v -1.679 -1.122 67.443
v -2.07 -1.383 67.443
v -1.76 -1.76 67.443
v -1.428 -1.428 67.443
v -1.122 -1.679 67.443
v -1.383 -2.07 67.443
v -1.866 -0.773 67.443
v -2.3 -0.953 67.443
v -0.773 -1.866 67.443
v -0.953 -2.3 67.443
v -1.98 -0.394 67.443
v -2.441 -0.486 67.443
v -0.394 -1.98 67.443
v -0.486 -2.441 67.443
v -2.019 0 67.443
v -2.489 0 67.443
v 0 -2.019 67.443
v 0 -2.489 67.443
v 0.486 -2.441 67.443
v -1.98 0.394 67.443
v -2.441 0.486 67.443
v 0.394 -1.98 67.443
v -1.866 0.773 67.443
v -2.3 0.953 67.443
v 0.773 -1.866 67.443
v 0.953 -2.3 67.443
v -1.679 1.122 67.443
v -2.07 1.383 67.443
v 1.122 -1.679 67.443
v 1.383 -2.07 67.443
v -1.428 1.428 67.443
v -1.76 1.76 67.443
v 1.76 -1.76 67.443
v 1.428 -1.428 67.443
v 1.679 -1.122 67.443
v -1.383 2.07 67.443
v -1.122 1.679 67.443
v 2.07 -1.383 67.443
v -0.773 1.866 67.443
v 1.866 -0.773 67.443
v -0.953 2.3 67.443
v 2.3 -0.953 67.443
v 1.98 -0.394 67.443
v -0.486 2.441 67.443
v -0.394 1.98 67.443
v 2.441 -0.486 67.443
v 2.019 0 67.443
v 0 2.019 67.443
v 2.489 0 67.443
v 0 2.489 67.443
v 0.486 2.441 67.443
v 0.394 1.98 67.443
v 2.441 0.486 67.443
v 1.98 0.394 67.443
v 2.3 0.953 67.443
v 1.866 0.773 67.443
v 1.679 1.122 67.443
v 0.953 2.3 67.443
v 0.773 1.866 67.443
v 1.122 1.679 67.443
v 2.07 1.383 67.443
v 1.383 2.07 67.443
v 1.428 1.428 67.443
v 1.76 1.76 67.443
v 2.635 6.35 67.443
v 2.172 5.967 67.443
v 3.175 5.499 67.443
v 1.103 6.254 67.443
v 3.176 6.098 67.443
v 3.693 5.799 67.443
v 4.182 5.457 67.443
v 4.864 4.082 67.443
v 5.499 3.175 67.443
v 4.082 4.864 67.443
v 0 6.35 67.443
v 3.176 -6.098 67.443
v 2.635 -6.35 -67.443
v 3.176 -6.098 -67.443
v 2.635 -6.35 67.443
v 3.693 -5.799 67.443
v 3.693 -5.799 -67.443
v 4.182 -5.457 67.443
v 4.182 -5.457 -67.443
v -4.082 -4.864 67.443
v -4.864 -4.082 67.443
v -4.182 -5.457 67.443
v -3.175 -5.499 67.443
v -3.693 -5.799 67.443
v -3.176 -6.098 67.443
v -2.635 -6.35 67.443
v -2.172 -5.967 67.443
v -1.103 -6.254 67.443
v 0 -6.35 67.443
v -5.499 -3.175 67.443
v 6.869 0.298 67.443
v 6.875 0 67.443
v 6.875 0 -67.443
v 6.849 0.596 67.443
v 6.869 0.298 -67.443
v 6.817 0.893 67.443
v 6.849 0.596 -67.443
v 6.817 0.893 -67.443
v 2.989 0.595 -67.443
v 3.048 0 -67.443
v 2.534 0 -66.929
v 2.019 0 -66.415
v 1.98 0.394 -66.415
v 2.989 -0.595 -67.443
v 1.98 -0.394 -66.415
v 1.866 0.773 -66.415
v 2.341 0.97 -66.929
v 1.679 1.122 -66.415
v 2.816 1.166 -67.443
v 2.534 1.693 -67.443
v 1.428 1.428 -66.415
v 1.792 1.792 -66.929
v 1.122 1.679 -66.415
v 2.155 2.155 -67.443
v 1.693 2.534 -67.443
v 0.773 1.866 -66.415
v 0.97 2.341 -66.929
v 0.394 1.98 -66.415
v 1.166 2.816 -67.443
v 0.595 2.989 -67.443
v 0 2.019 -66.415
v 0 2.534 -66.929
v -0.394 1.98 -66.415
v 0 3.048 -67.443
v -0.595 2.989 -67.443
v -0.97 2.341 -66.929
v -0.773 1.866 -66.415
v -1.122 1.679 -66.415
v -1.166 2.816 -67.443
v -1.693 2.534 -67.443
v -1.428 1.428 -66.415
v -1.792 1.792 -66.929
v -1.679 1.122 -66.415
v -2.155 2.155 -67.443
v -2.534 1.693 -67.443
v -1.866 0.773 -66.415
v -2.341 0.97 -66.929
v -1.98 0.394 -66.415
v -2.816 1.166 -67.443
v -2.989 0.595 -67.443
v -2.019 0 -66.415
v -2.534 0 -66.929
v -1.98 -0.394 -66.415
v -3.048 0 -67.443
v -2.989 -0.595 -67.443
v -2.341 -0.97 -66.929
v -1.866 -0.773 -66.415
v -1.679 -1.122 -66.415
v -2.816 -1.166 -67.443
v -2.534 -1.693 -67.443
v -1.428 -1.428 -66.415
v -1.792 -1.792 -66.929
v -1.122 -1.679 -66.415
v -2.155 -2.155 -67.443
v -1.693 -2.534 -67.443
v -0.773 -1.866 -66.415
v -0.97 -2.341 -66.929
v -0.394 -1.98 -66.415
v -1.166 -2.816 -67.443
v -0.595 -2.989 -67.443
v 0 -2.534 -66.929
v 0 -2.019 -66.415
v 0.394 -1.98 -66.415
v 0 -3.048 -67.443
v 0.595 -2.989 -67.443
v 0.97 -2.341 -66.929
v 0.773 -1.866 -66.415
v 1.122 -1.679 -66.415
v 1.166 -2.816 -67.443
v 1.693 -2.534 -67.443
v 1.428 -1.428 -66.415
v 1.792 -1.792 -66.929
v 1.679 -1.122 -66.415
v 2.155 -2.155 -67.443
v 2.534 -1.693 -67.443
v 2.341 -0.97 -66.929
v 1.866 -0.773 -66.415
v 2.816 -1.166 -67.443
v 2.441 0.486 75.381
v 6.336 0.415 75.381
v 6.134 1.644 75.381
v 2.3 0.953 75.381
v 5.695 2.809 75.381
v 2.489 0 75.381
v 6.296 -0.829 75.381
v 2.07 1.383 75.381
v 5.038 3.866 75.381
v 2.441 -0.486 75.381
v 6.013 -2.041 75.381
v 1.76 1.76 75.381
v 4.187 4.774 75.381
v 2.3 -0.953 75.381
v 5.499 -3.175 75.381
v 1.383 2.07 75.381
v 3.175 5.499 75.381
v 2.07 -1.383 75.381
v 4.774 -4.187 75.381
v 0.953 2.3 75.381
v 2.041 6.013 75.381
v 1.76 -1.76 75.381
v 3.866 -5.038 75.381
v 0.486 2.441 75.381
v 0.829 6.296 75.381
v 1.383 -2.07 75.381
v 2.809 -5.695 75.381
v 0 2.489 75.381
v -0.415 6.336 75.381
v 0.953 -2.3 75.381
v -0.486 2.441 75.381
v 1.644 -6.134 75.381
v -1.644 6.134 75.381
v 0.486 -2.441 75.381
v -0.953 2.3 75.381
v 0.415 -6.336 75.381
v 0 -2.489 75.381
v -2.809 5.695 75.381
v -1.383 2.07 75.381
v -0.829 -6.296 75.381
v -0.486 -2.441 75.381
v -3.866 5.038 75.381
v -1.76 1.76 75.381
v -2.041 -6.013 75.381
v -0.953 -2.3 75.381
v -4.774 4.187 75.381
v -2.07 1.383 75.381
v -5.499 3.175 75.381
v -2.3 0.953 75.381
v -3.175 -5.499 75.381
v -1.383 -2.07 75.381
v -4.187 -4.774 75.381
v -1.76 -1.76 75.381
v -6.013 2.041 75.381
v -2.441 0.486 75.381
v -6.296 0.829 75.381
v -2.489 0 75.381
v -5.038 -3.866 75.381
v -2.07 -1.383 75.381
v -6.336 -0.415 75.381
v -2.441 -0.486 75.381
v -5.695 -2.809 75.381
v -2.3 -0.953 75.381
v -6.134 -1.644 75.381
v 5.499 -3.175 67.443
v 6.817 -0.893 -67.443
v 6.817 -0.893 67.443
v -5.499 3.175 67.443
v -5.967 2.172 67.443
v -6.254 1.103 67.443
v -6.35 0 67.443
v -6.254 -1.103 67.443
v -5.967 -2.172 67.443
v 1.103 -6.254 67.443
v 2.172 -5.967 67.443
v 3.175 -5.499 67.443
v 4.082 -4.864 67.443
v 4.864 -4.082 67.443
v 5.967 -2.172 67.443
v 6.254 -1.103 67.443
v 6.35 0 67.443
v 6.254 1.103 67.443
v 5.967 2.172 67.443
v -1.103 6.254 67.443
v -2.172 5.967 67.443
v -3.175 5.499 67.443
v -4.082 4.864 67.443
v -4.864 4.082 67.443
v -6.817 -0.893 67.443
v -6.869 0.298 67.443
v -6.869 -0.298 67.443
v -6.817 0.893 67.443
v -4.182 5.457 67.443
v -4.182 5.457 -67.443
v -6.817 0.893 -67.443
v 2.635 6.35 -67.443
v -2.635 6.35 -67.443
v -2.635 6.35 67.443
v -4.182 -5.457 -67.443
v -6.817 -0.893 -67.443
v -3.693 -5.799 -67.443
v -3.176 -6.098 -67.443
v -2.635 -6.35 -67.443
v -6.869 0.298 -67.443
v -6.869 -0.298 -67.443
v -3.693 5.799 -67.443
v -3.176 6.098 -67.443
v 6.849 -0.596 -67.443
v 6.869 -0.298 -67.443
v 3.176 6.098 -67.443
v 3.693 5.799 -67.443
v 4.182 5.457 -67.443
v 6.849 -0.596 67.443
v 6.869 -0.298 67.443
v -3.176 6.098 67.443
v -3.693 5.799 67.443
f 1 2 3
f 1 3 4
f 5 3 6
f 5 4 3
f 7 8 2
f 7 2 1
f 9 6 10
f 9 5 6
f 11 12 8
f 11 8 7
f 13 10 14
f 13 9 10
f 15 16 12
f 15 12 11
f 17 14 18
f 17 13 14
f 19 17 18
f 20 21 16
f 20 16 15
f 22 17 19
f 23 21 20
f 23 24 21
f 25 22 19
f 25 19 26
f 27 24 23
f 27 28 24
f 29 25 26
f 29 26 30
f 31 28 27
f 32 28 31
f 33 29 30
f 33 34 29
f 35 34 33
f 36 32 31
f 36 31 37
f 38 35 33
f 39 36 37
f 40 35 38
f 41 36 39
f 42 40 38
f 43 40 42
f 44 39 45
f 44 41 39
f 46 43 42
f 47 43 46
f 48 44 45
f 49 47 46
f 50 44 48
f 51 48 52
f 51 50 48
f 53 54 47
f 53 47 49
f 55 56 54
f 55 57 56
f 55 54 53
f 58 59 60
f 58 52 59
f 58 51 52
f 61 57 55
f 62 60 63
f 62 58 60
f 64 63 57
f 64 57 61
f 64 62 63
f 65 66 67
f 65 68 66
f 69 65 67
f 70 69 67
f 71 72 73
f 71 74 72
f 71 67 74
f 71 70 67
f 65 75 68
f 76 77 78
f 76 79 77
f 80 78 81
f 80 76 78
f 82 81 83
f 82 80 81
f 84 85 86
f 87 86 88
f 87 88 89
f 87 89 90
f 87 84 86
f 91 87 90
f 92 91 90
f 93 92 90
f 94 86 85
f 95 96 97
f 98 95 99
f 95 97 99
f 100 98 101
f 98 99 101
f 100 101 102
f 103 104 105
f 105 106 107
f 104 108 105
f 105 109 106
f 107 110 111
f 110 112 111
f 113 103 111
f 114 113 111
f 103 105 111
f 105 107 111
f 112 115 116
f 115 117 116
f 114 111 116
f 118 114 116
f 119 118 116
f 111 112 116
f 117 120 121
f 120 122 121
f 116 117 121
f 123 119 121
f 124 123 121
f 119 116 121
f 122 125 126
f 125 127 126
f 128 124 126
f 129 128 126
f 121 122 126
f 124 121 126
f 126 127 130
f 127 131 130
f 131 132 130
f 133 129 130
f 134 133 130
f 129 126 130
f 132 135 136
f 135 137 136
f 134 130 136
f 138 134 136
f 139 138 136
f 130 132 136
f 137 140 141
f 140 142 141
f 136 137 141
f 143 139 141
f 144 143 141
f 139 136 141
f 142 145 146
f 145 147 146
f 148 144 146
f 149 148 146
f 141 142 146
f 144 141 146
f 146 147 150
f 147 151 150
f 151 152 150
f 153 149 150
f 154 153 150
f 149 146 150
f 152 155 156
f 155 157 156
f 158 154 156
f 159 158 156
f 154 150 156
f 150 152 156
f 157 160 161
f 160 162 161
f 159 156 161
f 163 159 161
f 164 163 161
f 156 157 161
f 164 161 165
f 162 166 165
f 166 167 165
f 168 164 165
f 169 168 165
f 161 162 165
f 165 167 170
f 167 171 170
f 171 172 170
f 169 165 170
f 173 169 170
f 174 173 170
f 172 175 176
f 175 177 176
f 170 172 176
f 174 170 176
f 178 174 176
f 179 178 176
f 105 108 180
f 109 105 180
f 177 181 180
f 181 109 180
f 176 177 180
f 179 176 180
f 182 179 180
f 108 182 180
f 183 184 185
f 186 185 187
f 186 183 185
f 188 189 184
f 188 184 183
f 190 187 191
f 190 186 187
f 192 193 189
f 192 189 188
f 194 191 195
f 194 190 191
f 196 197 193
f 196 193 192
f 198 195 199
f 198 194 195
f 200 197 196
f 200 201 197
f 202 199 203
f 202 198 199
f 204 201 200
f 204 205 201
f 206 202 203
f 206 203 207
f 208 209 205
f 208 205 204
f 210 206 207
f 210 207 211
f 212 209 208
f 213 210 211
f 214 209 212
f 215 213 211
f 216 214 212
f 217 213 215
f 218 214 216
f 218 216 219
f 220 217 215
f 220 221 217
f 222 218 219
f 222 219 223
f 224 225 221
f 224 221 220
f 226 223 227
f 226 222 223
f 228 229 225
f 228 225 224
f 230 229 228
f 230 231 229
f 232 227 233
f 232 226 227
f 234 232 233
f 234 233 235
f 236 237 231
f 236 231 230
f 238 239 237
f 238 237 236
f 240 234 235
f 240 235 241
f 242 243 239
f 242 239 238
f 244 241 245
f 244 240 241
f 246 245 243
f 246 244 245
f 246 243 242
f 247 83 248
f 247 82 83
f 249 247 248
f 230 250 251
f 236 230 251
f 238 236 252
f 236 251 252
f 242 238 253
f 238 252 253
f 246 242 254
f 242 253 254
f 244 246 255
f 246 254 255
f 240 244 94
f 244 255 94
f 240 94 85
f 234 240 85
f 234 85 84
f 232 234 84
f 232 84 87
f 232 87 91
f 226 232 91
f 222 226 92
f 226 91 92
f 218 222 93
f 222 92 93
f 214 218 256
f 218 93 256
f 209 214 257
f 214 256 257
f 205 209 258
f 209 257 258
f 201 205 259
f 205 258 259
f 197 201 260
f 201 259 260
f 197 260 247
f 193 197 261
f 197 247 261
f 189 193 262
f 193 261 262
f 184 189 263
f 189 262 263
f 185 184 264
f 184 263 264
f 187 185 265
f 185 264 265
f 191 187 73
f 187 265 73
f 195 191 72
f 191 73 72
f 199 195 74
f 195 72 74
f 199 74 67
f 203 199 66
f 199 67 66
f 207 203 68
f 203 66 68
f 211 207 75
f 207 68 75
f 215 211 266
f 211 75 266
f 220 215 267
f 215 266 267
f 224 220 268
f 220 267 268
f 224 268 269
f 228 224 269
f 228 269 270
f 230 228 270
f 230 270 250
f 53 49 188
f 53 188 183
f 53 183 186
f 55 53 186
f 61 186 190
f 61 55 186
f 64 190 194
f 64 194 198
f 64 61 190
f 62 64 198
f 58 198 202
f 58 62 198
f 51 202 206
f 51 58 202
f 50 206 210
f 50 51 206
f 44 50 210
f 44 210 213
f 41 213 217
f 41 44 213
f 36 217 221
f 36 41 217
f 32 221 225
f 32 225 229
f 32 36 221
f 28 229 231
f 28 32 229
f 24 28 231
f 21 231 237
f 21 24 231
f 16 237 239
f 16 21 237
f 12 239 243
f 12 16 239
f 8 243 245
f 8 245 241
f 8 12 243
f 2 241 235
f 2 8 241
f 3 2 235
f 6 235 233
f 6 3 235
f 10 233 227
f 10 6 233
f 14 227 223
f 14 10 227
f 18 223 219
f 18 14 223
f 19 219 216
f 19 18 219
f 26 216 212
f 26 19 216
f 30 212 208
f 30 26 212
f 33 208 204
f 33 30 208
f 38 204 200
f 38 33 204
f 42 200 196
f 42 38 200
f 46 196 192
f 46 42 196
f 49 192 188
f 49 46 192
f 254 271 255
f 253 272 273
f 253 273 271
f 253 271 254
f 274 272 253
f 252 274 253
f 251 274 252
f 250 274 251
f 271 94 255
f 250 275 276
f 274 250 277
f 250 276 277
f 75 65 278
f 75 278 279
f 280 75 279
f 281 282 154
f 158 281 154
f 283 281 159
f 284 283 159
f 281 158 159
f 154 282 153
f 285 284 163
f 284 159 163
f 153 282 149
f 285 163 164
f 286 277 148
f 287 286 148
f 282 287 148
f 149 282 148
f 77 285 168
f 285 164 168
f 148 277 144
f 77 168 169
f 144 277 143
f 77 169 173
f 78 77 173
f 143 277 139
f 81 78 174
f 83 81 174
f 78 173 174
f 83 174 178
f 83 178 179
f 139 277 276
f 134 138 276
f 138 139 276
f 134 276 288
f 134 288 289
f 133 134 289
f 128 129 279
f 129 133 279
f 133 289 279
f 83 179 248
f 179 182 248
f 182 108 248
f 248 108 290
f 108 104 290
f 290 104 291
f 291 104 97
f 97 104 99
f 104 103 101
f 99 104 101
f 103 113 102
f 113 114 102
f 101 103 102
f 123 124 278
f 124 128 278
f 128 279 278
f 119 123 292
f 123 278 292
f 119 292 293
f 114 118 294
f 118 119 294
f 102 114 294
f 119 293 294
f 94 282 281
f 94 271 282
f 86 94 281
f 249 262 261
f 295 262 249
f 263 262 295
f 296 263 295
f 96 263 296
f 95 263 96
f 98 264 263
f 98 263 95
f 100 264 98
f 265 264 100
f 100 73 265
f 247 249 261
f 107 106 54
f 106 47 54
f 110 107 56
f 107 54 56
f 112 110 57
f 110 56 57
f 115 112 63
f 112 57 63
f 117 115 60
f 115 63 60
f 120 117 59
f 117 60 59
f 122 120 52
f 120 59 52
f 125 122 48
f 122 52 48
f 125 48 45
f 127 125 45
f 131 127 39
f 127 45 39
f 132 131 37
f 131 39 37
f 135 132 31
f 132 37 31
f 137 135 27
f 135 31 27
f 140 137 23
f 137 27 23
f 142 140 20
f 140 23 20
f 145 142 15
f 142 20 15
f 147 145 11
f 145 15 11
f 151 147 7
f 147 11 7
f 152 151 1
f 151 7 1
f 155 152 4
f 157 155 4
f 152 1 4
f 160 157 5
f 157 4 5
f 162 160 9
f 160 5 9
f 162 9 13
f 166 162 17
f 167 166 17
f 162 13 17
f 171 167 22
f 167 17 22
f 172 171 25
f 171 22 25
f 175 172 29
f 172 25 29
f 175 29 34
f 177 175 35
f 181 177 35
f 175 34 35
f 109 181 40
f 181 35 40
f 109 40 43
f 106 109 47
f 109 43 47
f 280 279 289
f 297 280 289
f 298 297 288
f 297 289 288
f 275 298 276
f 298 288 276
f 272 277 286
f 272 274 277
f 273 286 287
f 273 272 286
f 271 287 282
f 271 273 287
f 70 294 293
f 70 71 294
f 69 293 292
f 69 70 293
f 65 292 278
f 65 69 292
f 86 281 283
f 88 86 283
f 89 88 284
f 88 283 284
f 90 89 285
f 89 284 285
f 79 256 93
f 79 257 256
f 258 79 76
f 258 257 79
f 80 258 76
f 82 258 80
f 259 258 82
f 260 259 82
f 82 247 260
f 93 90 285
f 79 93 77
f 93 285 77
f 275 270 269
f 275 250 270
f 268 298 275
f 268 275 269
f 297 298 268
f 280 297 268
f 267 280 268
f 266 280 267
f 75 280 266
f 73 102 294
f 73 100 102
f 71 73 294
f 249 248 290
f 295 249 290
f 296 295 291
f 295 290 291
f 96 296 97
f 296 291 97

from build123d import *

# Parameters (mm, degrees)
BOSS_EXTRUDE1_DEPTH              = 67.44335
SKETCH4_R                        = 6.35
SKETCH4_R_2                      = 2.4892
BOSS_EXTRUDE2_DEPTH              = 7.9375
F_10_32_TAPPED_HOLE1_D           = 4.0386
F_10_32_TAPPED_HOLE1_CSINK_D     = 6.096
F_10_32_TAPPED_HOLE1_CSINK_ANGLE = 90


with BuildPart() as part:
    # Sketch1 → Boss-Extrude1 (new, symmetric)
    with BuildSketch(Plane.XY):
        with BuildLine():
            ThreePointArc((4.181770846, 5.456960429), (3.437499983, 5.953924622), (2.634980936, 6.35))
            Line((2.634980936, 6.35), (-2.634980936, 6.35))
            ThreePointArc((-2.634980936, 6.35), (-3.437499983, 5.953924622), (-4.181770846, 5.456960429))
            Line((-4.181770846, 5.456960429), (-6.816751782, 0.893039571))
            ThreePointArc((-6.816751782, 0.893039571), (-6.874999966, 0), (-6.816751782, -0.893039571))
            Line((-6.816751782, -0.893039571), (-4.181770846, -5.456960429))
            ThreePointArc((-4.181770846, -5.456960429), (-3.437499983, -5.953924622), (-2.634980936, -6.35))
            Line((-2.634980936, -6.35), (2.634980936, -6.35))
            ThreePointArc((2.634980936, -6.35), (3.437499983, -5.953924622), (4.181770846, -5.456960429))
            Line((4.181770846, -5.456960429), (6.816751782, -0.893039571))
            ThreePointArc((6.816751782, -0.893039571), (6.860422465, -0.447468582), (6.874999966, 0))
            ThreePointArc((6.874999966, 0), (6.860422465, 0.447468582), (6.816751782, 0.893039571))
            Line((6.816751782, 0.893039571), (4.181770846, 5.456960429))
        make_face()
    extrude(amount=BOSS_EXTRUDE1_DEPTH, both=True)

    # Sketch4 → Boss-Extrude2 (add)
    with BuildSketch(Plane.XY.offset(67.44335)):
        with Locations(Location((0, 0, 0), (0, 0, 150))):
            Circle(SKETCH4_R)
        Circle(SKETCH4_R_2, mode=Mode.SUBTRACT)
    extrude(amount=BOSS_EXTRUDE2_DEPTH)

    # #10-32 Tapped Hole1 (through all)
    with Locations(Plane(origin=(0, 0, -67.44335), x_dir=(-1, 0, 0), z_dir=(0, 0, -1))):
        with Locations((0, 0)):
            CounterSinkHole(F_10_32_TAPPED_HOLE1_D / 2, F_10_32_TAPPED_HOLE1_CSINK_D / 2, counter_sink_angle=F_10_32_TAPPED_HOLE1_CSINK_ANGLE)


solid = part.part
